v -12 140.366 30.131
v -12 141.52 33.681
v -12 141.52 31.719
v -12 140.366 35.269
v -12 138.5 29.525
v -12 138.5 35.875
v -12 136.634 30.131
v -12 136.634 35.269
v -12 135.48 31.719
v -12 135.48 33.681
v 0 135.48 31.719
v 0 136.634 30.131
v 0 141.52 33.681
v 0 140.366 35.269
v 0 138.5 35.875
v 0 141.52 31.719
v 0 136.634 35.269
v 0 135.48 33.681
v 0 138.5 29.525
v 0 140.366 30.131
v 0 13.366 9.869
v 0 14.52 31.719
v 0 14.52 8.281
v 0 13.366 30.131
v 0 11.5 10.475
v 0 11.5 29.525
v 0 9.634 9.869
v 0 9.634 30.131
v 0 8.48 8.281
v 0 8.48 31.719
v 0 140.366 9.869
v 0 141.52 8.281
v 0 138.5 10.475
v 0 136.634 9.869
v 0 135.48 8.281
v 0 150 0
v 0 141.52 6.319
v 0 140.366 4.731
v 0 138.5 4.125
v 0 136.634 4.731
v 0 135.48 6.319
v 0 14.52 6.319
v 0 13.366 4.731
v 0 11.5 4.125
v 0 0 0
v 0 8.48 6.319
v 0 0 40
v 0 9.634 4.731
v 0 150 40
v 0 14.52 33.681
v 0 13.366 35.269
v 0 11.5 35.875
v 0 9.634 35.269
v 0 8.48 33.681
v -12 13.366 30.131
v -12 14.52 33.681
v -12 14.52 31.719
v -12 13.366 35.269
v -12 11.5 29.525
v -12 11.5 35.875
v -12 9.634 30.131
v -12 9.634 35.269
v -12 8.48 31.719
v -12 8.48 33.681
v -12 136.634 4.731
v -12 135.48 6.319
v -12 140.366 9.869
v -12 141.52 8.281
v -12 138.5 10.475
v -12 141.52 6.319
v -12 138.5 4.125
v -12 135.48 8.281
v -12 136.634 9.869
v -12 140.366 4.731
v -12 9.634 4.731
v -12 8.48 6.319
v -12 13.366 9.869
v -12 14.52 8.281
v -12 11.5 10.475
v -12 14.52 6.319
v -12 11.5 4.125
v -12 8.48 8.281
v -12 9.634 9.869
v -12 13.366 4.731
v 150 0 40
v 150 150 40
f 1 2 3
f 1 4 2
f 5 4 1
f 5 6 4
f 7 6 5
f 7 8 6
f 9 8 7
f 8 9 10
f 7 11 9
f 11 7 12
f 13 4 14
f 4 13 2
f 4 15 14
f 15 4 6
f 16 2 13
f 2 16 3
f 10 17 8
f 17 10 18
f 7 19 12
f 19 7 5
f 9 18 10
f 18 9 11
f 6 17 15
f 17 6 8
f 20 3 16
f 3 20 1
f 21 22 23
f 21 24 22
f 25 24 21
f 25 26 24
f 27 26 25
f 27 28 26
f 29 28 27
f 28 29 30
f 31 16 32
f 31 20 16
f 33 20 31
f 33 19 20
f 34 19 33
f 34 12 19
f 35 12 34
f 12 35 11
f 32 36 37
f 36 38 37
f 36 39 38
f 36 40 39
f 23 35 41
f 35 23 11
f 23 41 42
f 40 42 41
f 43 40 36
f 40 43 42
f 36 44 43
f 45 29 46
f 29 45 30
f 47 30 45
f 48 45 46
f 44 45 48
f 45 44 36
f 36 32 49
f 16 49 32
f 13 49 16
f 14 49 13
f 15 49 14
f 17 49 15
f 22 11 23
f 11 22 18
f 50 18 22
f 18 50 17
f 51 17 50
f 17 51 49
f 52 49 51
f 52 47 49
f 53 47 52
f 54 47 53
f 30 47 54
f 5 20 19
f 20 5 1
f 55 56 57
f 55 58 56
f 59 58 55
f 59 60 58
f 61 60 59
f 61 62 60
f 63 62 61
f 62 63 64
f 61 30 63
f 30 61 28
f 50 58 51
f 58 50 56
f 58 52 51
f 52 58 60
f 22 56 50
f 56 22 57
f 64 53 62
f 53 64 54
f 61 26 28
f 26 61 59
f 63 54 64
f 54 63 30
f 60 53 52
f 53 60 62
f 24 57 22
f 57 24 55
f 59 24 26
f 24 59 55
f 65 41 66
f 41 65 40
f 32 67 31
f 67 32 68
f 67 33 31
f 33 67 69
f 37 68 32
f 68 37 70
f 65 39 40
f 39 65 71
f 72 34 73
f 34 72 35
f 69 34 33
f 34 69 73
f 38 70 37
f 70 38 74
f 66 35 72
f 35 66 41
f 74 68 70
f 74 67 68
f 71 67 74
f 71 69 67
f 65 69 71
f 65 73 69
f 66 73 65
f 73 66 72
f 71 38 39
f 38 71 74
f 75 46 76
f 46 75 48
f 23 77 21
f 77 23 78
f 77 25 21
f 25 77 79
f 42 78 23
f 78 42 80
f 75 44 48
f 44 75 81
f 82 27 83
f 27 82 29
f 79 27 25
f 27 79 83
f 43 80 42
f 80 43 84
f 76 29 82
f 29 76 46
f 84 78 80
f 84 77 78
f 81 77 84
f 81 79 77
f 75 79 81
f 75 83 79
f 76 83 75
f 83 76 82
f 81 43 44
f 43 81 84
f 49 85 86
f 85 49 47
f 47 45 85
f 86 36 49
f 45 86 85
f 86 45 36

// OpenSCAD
////////////////////////////////////////////////////////////////////////////
// Manhattan Pegboard Collection v1 : Triangle Shelf
// designed in NYC by Matt Manhattan (mattmanhattan.com)
////////////////////////////////////////////////////////////////////////////

width = 150; // This is the width of the shelf
depth = 150; // This is the depth of the shelf
height = 40; // This is the width of the shelf
pegs = 5; // span between pegs [0 = centered (one peg // 1 = 2 pegs // 2 = 3 pegs // 3 = 4 pegs]

//////////////////////////////////////////////////////////////////
// Triangle Shelf
//////////////////////////////////////////////////////////////////

polyhedron
    (points = [
	       [0, 0, height],          // point 0
           [0, width, height],      // point 1
           [0, width, 0],           // point 2
           [0, 0, 0],               // point 3
           [depth, 0, height],      // point 4
           [depth, width, height],  // point 5
	       ], 
     faces = [
           [0,1,5],[0,5,4],          // top of triangle
           [0,4,3],                  // triangle on x-axis
           [5,1,2],                  // opposite triangle
           [1,0,2],[0,3,2],          // rear of triangle on y-axis
           [3,4,2],[5,2,4],          // angle of triangle
		  ]
     );
     
//////////////////////////////////////////////////////////////////
// Pegboard Pegs
//////////////////////////////////////////////////////////////////   

pegCenterToCenterDistance = 25.4; 	    // 1 inch spacing
pegDiameter = 6.35; 					// 1/4 inch peg holes
pegLength = 12;                         // length of the pegs
midpointX = width/2;
midpointY = height/2;

// leave this alone - it alters the center point of the model
centerequals = false; 
///////////////////

// PEG 1
// this rotates the peg 90 degrees
rotate([0,-90,0])
    {    
    translate([(midpointY+((pegCenterToCenterDistance/2))),(midpointX+((pegCenterToCenterDistance/2)*pegs)),0])    // moves PEG 1 to its position
        { 
        cylinder(h=pegLength, r=(pegDiameter/2), center=centerequals);  // PEG 1 (top left)
        }
        
    translate([(midpointY+((pegCenterToCenterDistance/2))),(midpointX-((pegCenterToCenterDistance/2)*pegs)),0])    // moves PEG 2 to its position
        {    
        cylinder(h=pegLength, r=(pegDiameter/2), center=centerequals); // PEG 2 (top right)
        }
        
    translate([(midpointY-((pegCenterToCenterDistance/2))),(midpointX+((pegCenterToCenterDistance/2)*pegs)),0])    // moves PEG 3 to its position
        { 
        cylinder(h=pegLength, r=(pegDiameter/2), center=centerequals);  // PEG 3 (bottom left)
        }
        
    translate([(midpointY-((pegCenterToCenterDistance/2))),(midpointX-((pegCenterToCenterDistance/2)*pegs)),0])    // moves PEG 4 to its position
        {    
        cylinder(h=pegLength, r=(pegDiameter/2), center=centerequals); // PEG 4 (bottom right)
        }
    }
 
